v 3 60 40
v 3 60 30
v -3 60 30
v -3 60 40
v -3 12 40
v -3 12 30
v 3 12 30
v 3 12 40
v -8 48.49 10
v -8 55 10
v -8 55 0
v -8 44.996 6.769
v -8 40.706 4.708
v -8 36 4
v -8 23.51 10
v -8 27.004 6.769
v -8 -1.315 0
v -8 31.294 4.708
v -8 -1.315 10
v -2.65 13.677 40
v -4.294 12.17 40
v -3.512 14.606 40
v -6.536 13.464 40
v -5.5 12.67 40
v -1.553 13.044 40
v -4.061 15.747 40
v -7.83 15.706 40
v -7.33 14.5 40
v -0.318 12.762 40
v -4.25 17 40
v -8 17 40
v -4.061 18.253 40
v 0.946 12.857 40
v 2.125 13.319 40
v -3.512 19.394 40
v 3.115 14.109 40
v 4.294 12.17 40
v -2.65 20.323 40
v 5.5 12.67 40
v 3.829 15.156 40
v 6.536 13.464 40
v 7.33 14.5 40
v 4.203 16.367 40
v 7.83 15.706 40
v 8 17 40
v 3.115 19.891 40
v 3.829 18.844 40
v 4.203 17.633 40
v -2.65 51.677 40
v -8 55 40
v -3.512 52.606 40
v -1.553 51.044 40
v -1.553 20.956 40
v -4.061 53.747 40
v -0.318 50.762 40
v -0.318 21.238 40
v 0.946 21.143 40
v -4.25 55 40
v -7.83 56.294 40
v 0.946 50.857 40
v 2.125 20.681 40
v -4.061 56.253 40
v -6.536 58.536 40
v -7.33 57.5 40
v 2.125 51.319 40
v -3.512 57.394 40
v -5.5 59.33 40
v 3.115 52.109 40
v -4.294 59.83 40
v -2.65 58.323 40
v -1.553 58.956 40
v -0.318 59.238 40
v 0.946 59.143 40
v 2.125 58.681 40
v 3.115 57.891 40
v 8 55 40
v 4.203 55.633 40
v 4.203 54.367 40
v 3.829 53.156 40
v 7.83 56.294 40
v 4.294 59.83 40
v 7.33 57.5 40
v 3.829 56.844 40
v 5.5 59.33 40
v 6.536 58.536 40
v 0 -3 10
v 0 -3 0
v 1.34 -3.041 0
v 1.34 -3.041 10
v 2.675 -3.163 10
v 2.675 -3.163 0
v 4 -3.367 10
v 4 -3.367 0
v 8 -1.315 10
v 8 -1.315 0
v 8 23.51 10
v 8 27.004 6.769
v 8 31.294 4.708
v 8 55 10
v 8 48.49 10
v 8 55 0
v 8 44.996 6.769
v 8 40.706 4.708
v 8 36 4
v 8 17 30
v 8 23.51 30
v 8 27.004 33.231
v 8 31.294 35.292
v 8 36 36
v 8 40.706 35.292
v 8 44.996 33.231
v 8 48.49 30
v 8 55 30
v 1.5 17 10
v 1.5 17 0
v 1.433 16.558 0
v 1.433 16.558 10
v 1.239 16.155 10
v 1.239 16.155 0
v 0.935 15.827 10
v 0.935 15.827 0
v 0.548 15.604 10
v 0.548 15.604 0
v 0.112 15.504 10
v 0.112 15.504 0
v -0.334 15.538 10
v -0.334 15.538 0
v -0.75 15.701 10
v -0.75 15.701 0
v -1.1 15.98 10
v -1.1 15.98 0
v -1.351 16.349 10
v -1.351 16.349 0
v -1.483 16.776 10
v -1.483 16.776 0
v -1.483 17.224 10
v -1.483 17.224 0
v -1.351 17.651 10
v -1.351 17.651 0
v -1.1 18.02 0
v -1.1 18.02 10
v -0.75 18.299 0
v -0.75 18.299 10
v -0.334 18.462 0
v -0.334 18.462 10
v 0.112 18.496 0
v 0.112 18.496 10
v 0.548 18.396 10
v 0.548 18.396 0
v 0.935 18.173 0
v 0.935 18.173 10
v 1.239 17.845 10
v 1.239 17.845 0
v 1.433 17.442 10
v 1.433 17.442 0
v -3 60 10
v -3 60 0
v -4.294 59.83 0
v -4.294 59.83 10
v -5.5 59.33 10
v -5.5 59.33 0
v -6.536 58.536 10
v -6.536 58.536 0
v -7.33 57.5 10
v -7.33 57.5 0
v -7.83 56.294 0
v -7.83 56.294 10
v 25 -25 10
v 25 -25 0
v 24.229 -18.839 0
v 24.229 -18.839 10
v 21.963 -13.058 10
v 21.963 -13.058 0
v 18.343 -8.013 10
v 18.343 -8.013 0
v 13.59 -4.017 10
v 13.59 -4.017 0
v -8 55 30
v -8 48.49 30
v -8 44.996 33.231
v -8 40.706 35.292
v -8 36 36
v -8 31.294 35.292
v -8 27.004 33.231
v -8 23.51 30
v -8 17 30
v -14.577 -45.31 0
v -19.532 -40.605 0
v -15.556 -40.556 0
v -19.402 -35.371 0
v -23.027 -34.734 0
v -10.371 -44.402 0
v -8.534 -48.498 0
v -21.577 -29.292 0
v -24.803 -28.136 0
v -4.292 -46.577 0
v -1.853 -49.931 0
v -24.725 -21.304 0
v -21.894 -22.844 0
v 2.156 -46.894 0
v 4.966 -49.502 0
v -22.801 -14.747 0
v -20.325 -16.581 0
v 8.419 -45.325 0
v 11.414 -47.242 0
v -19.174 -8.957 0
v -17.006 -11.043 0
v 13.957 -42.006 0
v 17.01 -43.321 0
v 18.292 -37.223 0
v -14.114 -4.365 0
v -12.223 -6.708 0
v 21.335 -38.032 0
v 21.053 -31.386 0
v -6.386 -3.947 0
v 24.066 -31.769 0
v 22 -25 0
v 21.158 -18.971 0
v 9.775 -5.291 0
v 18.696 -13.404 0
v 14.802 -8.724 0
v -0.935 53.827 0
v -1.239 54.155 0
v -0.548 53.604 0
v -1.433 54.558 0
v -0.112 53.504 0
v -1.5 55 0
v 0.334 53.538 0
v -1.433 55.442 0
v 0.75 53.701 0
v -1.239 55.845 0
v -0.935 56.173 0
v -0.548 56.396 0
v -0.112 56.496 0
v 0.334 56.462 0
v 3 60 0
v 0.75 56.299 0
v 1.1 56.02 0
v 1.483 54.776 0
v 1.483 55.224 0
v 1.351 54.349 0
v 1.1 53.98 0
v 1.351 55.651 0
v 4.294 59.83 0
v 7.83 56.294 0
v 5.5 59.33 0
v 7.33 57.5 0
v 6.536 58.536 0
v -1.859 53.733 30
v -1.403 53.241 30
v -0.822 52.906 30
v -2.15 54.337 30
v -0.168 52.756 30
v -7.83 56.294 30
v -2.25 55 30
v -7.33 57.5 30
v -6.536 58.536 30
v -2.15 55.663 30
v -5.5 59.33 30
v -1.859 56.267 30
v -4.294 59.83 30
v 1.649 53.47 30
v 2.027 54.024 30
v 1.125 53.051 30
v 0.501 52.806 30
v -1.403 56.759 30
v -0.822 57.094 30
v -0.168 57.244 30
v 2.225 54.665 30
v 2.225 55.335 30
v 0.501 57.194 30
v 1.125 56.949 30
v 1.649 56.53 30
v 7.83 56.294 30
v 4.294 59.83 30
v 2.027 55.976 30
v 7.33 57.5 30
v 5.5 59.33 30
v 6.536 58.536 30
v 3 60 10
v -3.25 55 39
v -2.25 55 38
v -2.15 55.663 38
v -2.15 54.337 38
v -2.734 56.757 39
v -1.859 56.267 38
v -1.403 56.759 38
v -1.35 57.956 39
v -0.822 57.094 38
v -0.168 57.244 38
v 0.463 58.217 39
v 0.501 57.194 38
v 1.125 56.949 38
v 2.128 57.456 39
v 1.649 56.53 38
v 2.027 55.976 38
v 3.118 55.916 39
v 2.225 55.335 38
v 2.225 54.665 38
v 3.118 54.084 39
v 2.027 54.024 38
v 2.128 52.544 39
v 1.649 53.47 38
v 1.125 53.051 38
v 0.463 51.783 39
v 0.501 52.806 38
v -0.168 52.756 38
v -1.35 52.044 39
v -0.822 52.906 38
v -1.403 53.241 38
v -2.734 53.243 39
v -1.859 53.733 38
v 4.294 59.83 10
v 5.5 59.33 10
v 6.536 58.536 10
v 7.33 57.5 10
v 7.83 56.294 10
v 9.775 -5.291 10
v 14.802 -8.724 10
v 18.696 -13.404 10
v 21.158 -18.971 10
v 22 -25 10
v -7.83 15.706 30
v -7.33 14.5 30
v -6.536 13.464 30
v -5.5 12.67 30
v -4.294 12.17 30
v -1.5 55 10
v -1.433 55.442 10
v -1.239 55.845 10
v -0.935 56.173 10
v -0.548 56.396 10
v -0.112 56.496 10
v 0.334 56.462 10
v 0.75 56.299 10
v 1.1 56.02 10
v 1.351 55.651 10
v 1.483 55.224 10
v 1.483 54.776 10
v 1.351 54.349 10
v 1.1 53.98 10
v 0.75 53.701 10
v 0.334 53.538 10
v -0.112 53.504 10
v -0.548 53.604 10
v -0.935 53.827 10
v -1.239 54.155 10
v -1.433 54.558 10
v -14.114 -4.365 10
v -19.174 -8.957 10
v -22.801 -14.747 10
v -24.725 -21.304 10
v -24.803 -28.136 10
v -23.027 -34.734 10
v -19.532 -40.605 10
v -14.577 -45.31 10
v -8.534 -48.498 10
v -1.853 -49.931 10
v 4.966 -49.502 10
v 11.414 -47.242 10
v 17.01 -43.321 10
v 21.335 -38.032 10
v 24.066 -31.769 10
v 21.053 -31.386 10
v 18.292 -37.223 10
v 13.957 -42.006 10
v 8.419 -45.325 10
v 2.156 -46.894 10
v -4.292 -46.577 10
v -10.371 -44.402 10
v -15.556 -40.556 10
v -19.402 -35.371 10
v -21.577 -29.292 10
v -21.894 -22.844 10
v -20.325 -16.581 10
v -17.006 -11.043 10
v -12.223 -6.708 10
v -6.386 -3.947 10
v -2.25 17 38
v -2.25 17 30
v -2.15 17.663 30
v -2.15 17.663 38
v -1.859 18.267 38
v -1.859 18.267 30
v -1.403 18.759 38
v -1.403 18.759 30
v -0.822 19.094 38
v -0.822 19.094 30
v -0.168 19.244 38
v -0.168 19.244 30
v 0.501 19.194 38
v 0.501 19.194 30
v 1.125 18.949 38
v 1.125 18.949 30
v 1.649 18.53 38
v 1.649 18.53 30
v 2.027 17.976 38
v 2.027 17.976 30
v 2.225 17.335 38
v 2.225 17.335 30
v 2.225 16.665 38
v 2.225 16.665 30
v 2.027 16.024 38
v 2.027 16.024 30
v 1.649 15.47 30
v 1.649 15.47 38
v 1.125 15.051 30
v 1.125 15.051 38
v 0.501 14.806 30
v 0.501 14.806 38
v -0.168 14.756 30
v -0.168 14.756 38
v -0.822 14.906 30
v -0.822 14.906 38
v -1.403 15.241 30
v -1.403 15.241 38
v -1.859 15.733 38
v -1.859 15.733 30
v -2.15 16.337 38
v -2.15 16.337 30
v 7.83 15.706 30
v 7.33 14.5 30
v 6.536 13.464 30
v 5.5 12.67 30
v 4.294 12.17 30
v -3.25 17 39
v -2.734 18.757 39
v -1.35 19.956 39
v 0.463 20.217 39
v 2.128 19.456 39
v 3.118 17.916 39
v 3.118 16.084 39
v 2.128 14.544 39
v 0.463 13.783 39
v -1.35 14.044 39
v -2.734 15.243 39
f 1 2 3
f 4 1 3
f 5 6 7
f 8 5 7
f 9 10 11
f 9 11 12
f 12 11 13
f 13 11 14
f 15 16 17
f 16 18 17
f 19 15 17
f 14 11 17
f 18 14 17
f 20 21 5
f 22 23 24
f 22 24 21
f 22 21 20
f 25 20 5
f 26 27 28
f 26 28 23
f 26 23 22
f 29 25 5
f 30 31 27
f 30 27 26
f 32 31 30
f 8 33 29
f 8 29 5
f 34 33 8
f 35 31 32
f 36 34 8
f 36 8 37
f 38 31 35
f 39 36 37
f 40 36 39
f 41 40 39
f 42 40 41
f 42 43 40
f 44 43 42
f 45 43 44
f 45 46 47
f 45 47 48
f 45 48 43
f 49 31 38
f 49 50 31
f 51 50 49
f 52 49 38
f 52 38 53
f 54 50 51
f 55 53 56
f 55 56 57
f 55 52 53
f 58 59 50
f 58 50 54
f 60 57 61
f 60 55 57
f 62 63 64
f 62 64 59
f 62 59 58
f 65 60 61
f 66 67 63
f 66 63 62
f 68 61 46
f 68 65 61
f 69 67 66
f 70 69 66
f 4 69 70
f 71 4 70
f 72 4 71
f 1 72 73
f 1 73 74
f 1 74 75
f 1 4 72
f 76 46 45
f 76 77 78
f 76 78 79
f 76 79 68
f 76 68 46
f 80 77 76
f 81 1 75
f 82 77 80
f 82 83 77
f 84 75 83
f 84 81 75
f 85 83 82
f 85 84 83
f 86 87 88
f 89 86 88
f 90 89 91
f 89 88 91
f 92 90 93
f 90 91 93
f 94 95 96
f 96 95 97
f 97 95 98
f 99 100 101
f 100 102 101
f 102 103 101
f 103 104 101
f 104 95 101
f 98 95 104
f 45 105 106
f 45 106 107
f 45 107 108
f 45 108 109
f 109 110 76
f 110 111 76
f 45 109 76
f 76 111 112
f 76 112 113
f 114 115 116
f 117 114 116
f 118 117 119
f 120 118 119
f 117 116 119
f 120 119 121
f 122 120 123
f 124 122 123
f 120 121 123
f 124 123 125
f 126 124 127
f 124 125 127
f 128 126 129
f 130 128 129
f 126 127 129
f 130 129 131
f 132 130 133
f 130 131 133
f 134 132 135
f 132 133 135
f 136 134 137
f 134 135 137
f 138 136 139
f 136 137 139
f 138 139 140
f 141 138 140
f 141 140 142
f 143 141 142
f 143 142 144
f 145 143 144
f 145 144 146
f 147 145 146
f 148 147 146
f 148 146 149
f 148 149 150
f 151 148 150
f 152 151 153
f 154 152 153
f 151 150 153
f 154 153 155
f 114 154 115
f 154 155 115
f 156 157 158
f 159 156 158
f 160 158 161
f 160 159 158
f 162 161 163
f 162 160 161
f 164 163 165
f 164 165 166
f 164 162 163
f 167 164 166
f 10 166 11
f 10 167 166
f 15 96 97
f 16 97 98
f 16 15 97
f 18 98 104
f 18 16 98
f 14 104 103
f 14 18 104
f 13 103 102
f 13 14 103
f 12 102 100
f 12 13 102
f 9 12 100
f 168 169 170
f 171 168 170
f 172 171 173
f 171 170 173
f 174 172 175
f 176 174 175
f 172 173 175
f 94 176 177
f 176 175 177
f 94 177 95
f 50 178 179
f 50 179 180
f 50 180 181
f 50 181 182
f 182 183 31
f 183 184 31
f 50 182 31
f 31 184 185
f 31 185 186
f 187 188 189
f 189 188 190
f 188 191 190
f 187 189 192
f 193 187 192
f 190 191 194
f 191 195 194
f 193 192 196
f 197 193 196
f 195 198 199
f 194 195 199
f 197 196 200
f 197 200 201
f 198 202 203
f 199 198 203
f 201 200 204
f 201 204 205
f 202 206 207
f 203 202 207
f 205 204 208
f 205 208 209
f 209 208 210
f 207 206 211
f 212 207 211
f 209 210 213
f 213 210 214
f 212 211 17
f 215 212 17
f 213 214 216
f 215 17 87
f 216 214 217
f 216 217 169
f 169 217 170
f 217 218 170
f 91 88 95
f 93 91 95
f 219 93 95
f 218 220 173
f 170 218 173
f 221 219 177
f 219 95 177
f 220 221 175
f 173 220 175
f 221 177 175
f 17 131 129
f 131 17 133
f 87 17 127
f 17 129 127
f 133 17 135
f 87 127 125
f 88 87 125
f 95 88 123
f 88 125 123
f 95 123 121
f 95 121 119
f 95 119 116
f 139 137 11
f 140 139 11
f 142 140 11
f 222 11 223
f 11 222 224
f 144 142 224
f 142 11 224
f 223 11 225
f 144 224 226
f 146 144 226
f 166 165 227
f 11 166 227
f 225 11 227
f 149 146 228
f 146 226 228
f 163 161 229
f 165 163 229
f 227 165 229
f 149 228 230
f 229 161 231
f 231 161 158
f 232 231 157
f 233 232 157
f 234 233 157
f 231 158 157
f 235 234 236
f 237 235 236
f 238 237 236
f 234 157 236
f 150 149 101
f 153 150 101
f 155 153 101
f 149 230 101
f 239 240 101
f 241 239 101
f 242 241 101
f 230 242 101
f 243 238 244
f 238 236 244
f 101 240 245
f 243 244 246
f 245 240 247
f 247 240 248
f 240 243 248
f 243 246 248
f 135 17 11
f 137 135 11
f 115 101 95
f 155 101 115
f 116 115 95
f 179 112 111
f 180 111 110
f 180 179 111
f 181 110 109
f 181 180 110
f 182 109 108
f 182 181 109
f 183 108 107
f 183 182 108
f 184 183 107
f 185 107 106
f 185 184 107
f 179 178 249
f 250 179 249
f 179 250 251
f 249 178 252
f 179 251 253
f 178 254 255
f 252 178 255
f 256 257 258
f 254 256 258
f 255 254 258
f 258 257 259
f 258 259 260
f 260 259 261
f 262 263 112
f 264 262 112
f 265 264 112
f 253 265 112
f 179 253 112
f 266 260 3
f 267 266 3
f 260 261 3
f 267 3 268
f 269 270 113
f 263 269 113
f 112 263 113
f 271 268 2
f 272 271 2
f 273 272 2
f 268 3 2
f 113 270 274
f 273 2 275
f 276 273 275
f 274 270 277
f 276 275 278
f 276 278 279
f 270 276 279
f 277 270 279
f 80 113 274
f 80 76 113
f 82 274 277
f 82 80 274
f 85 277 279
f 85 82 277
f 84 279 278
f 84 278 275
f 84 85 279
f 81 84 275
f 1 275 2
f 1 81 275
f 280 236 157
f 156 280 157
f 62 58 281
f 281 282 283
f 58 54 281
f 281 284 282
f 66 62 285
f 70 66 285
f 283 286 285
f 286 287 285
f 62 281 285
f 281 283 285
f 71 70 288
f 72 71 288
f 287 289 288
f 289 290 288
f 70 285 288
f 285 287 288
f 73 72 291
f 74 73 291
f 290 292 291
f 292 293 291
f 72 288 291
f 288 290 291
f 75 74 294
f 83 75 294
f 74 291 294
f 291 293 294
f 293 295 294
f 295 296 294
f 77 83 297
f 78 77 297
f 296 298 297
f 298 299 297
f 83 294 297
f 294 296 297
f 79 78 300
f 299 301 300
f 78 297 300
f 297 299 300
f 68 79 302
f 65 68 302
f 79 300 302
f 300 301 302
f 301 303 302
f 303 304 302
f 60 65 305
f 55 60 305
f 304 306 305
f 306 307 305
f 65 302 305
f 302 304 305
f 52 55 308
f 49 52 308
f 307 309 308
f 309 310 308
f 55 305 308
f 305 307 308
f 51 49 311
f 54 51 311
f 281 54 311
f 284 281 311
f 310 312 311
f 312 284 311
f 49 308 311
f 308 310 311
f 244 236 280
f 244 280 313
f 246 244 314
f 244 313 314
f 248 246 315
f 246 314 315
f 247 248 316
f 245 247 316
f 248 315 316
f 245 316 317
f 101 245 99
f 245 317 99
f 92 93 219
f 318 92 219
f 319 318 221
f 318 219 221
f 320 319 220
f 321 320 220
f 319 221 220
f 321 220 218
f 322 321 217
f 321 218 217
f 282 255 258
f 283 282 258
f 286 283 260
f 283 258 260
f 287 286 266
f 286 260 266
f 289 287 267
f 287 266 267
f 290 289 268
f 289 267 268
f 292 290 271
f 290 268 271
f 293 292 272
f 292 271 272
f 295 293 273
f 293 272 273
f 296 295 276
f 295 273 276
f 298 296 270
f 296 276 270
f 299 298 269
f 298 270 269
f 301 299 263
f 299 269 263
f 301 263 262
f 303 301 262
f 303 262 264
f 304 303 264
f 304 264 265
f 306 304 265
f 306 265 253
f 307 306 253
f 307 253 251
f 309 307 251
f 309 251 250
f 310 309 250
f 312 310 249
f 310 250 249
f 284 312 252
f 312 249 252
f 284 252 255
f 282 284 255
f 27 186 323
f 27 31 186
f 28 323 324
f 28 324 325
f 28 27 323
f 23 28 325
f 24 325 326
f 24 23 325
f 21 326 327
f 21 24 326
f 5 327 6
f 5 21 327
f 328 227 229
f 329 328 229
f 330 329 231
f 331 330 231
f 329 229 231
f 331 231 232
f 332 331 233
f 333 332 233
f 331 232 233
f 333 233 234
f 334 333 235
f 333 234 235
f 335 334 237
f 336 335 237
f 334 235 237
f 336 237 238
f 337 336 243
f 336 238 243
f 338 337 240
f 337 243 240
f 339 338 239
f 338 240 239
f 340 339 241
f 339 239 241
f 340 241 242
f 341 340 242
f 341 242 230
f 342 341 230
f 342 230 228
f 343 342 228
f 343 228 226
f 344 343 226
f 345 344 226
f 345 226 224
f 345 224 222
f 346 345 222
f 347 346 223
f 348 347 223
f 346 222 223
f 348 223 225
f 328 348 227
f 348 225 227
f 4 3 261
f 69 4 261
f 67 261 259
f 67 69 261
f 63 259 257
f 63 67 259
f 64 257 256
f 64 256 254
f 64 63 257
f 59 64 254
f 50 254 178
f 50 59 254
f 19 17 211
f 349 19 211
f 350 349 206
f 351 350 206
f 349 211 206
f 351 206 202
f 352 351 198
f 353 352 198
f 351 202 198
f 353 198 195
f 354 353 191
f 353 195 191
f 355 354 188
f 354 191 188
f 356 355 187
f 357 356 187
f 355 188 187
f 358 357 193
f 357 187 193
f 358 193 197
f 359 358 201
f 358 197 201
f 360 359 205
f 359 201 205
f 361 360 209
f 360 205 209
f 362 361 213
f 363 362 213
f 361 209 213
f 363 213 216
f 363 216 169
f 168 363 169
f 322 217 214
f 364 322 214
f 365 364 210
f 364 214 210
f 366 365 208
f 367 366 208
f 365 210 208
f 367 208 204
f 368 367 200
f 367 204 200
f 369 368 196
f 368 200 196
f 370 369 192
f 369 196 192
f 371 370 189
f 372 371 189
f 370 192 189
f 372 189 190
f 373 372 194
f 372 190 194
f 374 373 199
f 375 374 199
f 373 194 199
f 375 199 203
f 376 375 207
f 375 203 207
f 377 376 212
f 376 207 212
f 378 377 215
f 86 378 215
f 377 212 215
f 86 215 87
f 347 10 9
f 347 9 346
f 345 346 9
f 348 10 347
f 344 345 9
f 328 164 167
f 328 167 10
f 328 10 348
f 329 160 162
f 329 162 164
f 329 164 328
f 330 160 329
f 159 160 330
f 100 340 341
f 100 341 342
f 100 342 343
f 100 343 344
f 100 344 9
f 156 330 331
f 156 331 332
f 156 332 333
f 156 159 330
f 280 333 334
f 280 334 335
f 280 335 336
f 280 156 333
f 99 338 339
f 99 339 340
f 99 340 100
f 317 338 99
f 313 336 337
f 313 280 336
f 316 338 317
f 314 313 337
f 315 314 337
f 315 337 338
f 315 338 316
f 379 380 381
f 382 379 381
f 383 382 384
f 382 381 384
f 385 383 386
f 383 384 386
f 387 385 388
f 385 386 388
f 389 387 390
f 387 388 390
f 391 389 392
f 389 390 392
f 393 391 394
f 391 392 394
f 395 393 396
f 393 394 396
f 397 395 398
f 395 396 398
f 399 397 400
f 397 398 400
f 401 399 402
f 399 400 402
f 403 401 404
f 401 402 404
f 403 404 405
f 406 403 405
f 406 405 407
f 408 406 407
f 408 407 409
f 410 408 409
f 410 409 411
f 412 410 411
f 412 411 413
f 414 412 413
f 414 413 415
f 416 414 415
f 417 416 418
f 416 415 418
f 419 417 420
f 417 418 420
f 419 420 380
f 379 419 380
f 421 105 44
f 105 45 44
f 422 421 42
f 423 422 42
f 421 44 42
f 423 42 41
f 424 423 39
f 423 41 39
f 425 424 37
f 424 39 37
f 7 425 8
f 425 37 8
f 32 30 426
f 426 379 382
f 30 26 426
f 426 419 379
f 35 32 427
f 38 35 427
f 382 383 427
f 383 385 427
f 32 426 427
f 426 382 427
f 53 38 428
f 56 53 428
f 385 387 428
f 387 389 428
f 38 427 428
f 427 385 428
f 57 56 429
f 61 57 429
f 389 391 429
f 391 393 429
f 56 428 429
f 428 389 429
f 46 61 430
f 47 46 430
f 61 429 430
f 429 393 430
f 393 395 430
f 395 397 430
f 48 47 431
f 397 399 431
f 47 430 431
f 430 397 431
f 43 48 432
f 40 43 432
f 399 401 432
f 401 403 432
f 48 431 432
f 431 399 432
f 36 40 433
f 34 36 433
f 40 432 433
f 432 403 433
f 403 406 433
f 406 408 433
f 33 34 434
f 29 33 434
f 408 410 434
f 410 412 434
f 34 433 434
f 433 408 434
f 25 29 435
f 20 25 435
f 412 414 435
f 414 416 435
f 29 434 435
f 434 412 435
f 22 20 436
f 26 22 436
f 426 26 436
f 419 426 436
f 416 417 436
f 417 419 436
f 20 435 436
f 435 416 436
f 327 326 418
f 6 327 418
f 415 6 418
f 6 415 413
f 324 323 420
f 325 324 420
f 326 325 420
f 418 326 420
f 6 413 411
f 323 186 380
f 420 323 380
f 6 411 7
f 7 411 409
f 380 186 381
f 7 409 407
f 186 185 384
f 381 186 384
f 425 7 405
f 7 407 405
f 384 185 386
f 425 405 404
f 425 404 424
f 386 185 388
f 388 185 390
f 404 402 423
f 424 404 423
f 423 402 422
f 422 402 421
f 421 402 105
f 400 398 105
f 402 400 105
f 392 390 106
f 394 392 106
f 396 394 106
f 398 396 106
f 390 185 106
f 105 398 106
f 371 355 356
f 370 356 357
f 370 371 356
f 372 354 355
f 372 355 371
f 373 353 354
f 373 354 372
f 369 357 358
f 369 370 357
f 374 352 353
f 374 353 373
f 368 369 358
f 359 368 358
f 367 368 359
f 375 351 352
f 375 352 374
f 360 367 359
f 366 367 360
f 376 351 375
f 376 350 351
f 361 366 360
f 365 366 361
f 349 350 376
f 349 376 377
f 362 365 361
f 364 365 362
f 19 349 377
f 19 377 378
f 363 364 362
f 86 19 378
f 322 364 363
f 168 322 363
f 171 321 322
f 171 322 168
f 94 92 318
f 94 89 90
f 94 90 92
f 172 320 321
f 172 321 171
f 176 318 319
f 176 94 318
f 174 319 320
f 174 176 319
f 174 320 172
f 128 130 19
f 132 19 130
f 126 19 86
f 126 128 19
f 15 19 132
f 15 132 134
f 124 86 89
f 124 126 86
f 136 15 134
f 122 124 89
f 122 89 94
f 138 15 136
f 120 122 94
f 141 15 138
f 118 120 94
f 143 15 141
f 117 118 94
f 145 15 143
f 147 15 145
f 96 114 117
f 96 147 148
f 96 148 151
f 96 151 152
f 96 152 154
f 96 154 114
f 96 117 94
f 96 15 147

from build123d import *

# Parameters (mm, degrees)
F1_DEPTH      = 10
F0_W          = 8
F0_H          = 2
F2_DEPTH      = 10
F3_START      = 30
F3_DEPTH      = 10
F4_R          = 16
F5_DEPTH      = 25
F5_DEPTH_BACK = 25
F6_DEPTH      = 25
F6_DEPTH_BACK = 25
F7_SIZE       = 2
F8_R          = 5
F8_2_R        = 5


with BuildPart() as f1:
    # F0 (on Top) → F1 (new body)
    with BuildSketch(Plane.XY):
        with BuildLine():
            Line((-8, 10), (-8, -1.3145614353))
            ThreePointArc((-8, -1.3145614353), (-4.0536425523, -0.3308293196), (0, 0))
            Line((0, 0), (0, 10))
            Line((0, 10), (-8, 10))
        make_face()
        with BuildLine():
            ThreePointArc((4, -0.3220746415), (6.0204864844, -0.7357517633), (8, -1.3145614353))
            Line((8, -1.3145614353), (8, 10))
            Line((8, 10), (4, 10))
            Line((4, 10), (4, -0.3220746415))
        make_face()
        with BuildLine():
            ThreePointArc((-8, -1.3145614353), (-14.5773797371, -45.3100960116), (25, -25))
            ThreePointArc((25, -25), (20.3100960116, -10.4226202629), (8, -1.3145614353))
            ThreePointArc((8, -1.3145614353), (6.0204864844, -0.7357517633), (4, -0.3220746415))
            Line((4, -0.3220746415), (4, -3.3666923472))
            ThreePointArc((4, -3.3666923472), (16.9115345253, -10.9287527205), (22, -25))
            ThreePointArc((22, -25), (-15.5563491861, -40.5563491861), (0, -3))
            Line((0, -3), (0, 0))
            ThreePointArc((0, 0), (-4.0536425523, -0.3308293196), (-8, -1.3145614353))
        make_face()
        with BuildLine():
            ThreePointArc((0, 0), (2.0064727804, -0.0806487448), (4, -0.3220746415))
            Line((4, -0.3220746415), (4, 10))
            Line((4, 10), (8, 10))
            Line((8, 10), (8, 12))
            Line((8, 12), (0, 12))
            Line((0, 12), (0, 10))
            Line((0, 10), (0, 0))
        make_face()
        with BuildLine():
            Line((4, -3.3666923472), (4, -0.3220746415))
            ThreePointArc((4, -0.3220746415), (2.0064727804, -0.0806487448), (0, 0))
            Line((0, 0), (0, -3))
            ThreePointArc((0, -3), (2.008386372, -3.0918648858), (4, -3.3666923472))
        make_face()
    extrude(amount=F1_DEPTH)

    # F0 (on Top) → F2 (join)
    with BuildSketch(Plane.XY):
        with BuildLine():
            Line((2.25, 55), (8, 55))
            Line((8, 55), (8, 60))
            Line((8, 60), (-8, 60))
            Line((-8, 60), (-8, 55))
            Line((-8, 55), (-2.25, 55))
            ThreePointArc((-2.25, 55), (0, 57.25), (2.25, 55))
        make_face()
        with BuildLine():
            Line((2.25, 17), (8, 17))
            Line((8, 17), (8, 55))
            Line((8, 55), (2.25, 55))
            ThreePointArc((2.25, 55), (0, 52.75), (-2.25, 55))
            Line((-2.25, 55), (-8, 55))
            Line((-8, 55), (-8, 17))
            Line((-8, 17), (-2.25, 17))
            ThreePointArc((-2.25, 17), (0, 19.25), (2.25, 17))
        make_face()
        with BuildLine():
            Line((1.5, 17), (2.25, 17))
            ThreePointArc((2.25, 17), (0, 19.25), (-2.25, 17))
            Line((-2.25, 17), (-1.5, 17))
            ThreePointArc((-1.5, 17), (0, 18.5), (1.5, 17))
        make_face()
        with BuildLine():
            Line((0, 12), (8, 12))
            Line((8, 12), (8, 17))
            Line((8, 17), (2.25, 17))
            ThreePointArc((2.25, 17), (0, 14.75), (-2.25, 17))
            Line((-2.25, 17), (-8, 17))
            Line((-8, 17), (-8, 12))
            Line((-8, 12), (0, 12))
        make_face()
        with BuildLine():
            ThreePointArc((-2.25, 17), (0, 14.75), (2.25, 17))
            Line((2.25, 17), (1.5, 17))
            ThreePointArc((1.5, 17), (0, 15.5), (-1.5, 17))
            Line((-1.5, 17), (-2.25, 17))
        make_face()
        with Locations((-4, 11)):
            Rectangle(F0_W, F0_H)
        with BuildLine():
            ThreePointArc((-2.25, 55), (0, 52.75), (2.25, 55))
            Line((2.25, 55), (1.5, 55))
            ThreePointArc((1.5, 55), (0, 53.5), (-1.5, 55))
            Line((-1.5, 55), (-2.25, 55))
        make_face()
        with BuildLine():
            Line((1.5, 55), (2.25, 55))
            ThreePointArc((2.25, 55), (0, 57.25), (-2.25, 55))
            Line((-2.25, 55), (-1.5, 55))
            ThreePointArc((-1.5, 55), (0, 56.5), (1.5, 55))
        make_face()
    extrude(amount=F2_DEPTH)


with BuildPart() as f3:
    # F0 (on Top) → F3 (new body)
    with BuildSketch(Plane.XY.offset(F3_START)):
        with BuildLine():
            Line((0, 12), (8, 12))
            Line((8, 12), (8, 17))
            Line((8, 17), (2.25, 17))
            ThreePointArc((2.25, 17), (0, 14.75), (-2.25, 17))
            Line((-2.25, 17), (-8, 17))
            Line((-8, 17), (-8, 12))
            Line((-8, 12), (0, 12))
        make_face()
        with BuildLine():
            Line((2.25, 17), (8, 17))
            Line((8, 17), (8, 55))
            Line((8, 55), (2.25, 55))
            ThreePointArc((2.25, 55), (0, 52.75), (-2.25, 55))
            Line((-2.25, 55), (-8, 55))
            Line((-8, 55), (-8, 17))
            Line((-8, 17), (-2.25, 17))
            ThreePointArc((-2.25, 17), (0, 19.25), (2.25, 17))
        make_face()
        with BuildLine():
            Line((2.25, 55), (8, 55))
            Line((8, 55), (8, 60))
            Line((8, 60), (-8, 60))
            Line((-8, 60), (-8, 55))
            Line((-8, 55), (-2.25, 55))
            ThreePointArc((-2.25, 55), (0, 57.25), (2.25, 55))
        make_face()
    extrude(amount=F3_DEPTH)


with BuildPart() as f5_tool:
    # F4 (on Right) → F5 (new body, two sides)
    with BuildSketch(Plane.YZ) as f5_sk:
        with Locations((36, 20)):
            Circle(F4_R)
    extrude(amount=-F5_DEPTH)
    extrude(f5_sk.sketch, amount=F5_DEPTH_BACK)


with BuildPart() as f1_1:
    add(f1.part)

    # F5: cut by f5_tool
    add(f5_tool.part, mode=Mode.SUBTRACT)

    # F4 (on Right) → F6 (cut, two sides)
    with BuildSketch(Plane.YZ) as f6_sk:
        with Locations((36, 20)):
            Circle(F4_R)
    extrude(amount=F6_DEPTH, mode=Mode.SUBTRACT)
    extrude(f6_sk.sketch, amount=-F6_DEPTH_BACK, mode=Mode.SUBTRACT)

    # F8#2
    f8_2_edges = [f1_1.edges().sort_by_distance(p)[0] for p in [
        (-8, 60, 5),
        (8, 60, 5),
    ]]
    fillet(f8_2_edges, radius=F8_2_R)


with BuildPart() as f3_1:
    add(f3.part)

    # F5: cut by f5_tool
    add(f5_tool.part, mode=Mode.SUBTRACT)

    # F7
    f7_edges = [f3_1.edges().sort_by_distance(p)[0] for p in [
        (2.25, 17, 40),
        (2.25, 55, 40),
    ]]
    chamfer(f7_edges, length=F7_SIZE)

    # F8
    f8_edges = [f3_1.edges().sort_by_distance(p)[0] for p in [
        (8, 12, 35),
        (-8, 12, 35),
        (-8, 60, 35),
        (8, 60, 35),
    ]]
    fillet(f8_edges, radius=F8_R)


solid = Compound([f1_1.part, f3_1.part])
